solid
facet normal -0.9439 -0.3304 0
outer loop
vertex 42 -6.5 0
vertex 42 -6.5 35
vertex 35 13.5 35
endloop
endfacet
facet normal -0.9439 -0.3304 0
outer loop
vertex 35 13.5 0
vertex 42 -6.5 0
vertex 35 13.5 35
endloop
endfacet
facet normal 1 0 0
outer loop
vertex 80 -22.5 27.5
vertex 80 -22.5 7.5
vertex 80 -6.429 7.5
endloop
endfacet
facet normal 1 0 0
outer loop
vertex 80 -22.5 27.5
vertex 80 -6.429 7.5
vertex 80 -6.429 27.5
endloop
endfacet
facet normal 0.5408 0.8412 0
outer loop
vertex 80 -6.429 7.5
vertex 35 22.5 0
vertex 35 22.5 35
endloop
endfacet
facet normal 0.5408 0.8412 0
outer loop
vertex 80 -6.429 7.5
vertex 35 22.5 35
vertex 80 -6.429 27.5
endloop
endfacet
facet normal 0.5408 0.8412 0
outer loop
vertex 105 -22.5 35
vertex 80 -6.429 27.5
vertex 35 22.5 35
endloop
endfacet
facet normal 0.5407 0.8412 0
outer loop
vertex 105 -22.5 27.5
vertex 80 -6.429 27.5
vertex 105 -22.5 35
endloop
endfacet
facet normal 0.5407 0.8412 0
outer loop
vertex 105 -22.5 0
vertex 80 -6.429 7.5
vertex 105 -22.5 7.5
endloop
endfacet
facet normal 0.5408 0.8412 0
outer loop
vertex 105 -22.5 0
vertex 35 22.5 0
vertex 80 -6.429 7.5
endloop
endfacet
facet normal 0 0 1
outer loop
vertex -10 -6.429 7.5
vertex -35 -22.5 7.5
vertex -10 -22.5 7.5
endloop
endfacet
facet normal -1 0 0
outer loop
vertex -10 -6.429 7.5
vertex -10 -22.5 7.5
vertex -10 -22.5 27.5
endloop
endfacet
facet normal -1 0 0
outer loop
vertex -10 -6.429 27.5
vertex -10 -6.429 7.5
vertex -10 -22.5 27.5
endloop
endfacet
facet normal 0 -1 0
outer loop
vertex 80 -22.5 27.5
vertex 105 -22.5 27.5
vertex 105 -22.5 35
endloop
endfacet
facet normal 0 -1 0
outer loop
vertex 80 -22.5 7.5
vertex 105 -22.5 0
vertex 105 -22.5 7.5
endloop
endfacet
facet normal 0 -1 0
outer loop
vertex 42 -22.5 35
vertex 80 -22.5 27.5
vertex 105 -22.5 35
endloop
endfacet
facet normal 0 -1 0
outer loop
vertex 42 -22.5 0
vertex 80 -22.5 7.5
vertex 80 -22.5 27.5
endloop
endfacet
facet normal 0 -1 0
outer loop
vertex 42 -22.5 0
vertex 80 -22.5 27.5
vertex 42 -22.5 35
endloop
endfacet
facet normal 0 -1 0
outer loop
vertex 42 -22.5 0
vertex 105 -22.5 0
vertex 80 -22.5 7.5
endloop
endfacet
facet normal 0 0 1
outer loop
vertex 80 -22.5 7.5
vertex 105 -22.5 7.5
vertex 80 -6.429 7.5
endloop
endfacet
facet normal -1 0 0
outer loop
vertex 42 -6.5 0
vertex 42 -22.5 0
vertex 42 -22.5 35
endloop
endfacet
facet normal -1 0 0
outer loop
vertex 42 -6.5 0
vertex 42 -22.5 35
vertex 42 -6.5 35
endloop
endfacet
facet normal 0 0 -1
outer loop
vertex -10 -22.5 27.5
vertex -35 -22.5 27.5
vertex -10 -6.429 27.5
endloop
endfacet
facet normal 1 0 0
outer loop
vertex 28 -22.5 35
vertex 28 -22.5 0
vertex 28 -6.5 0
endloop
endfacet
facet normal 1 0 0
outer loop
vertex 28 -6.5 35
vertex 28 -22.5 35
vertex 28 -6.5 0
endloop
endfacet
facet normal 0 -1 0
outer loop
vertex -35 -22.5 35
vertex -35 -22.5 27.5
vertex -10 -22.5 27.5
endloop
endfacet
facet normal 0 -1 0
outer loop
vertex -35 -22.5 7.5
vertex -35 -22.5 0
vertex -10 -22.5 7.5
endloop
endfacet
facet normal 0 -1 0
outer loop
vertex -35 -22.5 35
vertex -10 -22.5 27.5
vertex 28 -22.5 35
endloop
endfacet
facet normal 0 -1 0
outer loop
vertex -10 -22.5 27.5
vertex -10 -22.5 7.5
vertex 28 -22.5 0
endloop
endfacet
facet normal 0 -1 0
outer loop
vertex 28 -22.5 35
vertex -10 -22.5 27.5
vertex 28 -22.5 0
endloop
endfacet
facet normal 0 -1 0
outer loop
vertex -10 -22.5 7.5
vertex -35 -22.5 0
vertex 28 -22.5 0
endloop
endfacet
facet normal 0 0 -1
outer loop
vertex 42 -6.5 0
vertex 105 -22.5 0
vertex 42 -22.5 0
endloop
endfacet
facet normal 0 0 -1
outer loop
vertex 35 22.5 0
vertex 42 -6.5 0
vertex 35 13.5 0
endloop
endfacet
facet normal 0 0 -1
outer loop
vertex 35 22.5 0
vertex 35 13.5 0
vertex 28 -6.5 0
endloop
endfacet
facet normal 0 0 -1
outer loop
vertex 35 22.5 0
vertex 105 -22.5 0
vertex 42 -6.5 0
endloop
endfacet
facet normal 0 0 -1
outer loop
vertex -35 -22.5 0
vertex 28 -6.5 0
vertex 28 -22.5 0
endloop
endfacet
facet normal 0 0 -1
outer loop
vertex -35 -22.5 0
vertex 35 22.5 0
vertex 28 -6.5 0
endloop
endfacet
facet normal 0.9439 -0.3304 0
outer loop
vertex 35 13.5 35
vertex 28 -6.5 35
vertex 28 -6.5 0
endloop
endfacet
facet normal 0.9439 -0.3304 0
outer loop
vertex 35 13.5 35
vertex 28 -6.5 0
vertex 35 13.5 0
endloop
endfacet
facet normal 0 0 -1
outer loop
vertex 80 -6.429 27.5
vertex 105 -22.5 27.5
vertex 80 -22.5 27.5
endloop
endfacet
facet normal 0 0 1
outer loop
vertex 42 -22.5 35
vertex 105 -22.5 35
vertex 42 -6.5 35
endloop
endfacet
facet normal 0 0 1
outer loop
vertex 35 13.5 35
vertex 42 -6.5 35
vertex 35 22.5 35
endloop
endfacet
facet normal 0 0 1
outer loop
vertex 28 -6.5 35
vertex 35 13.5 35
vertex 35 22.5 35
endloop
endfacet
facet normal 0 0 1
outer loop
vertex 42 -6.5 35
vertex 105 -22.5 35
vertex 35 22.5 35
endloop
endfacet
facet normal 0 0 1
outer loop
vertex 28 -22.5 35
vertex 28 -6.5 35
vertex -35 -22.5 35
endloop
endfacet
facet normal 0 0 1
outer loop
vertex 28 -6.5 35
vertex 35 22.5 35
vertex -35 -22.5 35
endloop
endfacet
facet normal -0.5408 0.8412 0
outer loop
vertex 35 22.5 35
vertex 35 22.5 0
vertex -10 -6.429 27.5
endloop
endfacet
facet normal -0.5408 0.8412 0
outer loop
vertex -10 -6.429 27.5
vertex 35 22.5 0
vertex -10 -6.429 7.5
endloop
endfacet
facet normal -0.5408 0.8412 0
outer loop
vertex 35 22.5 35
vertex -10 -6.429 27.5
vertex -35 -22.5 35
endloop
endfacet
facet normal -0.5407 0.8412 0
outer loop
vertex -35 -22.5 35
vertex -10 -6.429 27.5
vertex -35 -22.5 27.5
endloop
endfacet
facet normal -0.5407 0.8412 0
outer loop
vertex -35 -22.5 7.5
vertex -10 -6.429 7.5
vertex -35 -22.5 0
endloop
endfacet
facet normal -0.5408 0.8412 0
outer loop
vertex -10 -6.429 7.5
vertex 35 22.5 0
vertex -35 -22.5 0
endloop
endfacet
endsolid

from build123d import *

# Parameters (mm, degrees)
EXTRUDE_1_DEPTH     = 35
SKETCH_2_W          = 25
SKETCH_2_H          = 20
CUT_EXTRUDE_1_DEPTH = 67.895440801


with BuildPart() as part:
    # Эскиз1 → Бобышка-Вытянуть1 (new body)
    with BuildSketch(Plane.XY):
        Polygon((35, 22.5), (-35, -22.5), (28, -22.5), (28, -6.5), (35, 13.5), align=None)
    extrude_1 = extrude(amount=EXTRUDE_1_DEPTH)

    # Эскиз2 → Вырез-Вытянуть1 (cut, through all)
    with BuildSketch(Plane.XZ.offset(22.5)):
        with Locations((-22.5, 17.5)):
            Rectangle(SKETCH_2_W, SKETCH_2_H)
    cut_extrude_1 = extrude(amount=-CUT_EXTRUDE_1_DEPTH, mode=Mode.SUBTRACT)

    # Зеркальное отражение1: Бобышка-Вытянуть1, Вырез-Вытянуть1 across plane
    add(extrude_1.mirror(Plane(origin=(35, 0, 35), x_dir=(0, 0, 1), z_dir=(-1, 0, 0))))
    add(cut_extrude_1.mirror(Plane(origin=(35, 0, 35), x_dir=(0, 0, 1), z_dir=(-1, 0, 0))), mode=Mode.SUBTRACT)


solid = part.part
